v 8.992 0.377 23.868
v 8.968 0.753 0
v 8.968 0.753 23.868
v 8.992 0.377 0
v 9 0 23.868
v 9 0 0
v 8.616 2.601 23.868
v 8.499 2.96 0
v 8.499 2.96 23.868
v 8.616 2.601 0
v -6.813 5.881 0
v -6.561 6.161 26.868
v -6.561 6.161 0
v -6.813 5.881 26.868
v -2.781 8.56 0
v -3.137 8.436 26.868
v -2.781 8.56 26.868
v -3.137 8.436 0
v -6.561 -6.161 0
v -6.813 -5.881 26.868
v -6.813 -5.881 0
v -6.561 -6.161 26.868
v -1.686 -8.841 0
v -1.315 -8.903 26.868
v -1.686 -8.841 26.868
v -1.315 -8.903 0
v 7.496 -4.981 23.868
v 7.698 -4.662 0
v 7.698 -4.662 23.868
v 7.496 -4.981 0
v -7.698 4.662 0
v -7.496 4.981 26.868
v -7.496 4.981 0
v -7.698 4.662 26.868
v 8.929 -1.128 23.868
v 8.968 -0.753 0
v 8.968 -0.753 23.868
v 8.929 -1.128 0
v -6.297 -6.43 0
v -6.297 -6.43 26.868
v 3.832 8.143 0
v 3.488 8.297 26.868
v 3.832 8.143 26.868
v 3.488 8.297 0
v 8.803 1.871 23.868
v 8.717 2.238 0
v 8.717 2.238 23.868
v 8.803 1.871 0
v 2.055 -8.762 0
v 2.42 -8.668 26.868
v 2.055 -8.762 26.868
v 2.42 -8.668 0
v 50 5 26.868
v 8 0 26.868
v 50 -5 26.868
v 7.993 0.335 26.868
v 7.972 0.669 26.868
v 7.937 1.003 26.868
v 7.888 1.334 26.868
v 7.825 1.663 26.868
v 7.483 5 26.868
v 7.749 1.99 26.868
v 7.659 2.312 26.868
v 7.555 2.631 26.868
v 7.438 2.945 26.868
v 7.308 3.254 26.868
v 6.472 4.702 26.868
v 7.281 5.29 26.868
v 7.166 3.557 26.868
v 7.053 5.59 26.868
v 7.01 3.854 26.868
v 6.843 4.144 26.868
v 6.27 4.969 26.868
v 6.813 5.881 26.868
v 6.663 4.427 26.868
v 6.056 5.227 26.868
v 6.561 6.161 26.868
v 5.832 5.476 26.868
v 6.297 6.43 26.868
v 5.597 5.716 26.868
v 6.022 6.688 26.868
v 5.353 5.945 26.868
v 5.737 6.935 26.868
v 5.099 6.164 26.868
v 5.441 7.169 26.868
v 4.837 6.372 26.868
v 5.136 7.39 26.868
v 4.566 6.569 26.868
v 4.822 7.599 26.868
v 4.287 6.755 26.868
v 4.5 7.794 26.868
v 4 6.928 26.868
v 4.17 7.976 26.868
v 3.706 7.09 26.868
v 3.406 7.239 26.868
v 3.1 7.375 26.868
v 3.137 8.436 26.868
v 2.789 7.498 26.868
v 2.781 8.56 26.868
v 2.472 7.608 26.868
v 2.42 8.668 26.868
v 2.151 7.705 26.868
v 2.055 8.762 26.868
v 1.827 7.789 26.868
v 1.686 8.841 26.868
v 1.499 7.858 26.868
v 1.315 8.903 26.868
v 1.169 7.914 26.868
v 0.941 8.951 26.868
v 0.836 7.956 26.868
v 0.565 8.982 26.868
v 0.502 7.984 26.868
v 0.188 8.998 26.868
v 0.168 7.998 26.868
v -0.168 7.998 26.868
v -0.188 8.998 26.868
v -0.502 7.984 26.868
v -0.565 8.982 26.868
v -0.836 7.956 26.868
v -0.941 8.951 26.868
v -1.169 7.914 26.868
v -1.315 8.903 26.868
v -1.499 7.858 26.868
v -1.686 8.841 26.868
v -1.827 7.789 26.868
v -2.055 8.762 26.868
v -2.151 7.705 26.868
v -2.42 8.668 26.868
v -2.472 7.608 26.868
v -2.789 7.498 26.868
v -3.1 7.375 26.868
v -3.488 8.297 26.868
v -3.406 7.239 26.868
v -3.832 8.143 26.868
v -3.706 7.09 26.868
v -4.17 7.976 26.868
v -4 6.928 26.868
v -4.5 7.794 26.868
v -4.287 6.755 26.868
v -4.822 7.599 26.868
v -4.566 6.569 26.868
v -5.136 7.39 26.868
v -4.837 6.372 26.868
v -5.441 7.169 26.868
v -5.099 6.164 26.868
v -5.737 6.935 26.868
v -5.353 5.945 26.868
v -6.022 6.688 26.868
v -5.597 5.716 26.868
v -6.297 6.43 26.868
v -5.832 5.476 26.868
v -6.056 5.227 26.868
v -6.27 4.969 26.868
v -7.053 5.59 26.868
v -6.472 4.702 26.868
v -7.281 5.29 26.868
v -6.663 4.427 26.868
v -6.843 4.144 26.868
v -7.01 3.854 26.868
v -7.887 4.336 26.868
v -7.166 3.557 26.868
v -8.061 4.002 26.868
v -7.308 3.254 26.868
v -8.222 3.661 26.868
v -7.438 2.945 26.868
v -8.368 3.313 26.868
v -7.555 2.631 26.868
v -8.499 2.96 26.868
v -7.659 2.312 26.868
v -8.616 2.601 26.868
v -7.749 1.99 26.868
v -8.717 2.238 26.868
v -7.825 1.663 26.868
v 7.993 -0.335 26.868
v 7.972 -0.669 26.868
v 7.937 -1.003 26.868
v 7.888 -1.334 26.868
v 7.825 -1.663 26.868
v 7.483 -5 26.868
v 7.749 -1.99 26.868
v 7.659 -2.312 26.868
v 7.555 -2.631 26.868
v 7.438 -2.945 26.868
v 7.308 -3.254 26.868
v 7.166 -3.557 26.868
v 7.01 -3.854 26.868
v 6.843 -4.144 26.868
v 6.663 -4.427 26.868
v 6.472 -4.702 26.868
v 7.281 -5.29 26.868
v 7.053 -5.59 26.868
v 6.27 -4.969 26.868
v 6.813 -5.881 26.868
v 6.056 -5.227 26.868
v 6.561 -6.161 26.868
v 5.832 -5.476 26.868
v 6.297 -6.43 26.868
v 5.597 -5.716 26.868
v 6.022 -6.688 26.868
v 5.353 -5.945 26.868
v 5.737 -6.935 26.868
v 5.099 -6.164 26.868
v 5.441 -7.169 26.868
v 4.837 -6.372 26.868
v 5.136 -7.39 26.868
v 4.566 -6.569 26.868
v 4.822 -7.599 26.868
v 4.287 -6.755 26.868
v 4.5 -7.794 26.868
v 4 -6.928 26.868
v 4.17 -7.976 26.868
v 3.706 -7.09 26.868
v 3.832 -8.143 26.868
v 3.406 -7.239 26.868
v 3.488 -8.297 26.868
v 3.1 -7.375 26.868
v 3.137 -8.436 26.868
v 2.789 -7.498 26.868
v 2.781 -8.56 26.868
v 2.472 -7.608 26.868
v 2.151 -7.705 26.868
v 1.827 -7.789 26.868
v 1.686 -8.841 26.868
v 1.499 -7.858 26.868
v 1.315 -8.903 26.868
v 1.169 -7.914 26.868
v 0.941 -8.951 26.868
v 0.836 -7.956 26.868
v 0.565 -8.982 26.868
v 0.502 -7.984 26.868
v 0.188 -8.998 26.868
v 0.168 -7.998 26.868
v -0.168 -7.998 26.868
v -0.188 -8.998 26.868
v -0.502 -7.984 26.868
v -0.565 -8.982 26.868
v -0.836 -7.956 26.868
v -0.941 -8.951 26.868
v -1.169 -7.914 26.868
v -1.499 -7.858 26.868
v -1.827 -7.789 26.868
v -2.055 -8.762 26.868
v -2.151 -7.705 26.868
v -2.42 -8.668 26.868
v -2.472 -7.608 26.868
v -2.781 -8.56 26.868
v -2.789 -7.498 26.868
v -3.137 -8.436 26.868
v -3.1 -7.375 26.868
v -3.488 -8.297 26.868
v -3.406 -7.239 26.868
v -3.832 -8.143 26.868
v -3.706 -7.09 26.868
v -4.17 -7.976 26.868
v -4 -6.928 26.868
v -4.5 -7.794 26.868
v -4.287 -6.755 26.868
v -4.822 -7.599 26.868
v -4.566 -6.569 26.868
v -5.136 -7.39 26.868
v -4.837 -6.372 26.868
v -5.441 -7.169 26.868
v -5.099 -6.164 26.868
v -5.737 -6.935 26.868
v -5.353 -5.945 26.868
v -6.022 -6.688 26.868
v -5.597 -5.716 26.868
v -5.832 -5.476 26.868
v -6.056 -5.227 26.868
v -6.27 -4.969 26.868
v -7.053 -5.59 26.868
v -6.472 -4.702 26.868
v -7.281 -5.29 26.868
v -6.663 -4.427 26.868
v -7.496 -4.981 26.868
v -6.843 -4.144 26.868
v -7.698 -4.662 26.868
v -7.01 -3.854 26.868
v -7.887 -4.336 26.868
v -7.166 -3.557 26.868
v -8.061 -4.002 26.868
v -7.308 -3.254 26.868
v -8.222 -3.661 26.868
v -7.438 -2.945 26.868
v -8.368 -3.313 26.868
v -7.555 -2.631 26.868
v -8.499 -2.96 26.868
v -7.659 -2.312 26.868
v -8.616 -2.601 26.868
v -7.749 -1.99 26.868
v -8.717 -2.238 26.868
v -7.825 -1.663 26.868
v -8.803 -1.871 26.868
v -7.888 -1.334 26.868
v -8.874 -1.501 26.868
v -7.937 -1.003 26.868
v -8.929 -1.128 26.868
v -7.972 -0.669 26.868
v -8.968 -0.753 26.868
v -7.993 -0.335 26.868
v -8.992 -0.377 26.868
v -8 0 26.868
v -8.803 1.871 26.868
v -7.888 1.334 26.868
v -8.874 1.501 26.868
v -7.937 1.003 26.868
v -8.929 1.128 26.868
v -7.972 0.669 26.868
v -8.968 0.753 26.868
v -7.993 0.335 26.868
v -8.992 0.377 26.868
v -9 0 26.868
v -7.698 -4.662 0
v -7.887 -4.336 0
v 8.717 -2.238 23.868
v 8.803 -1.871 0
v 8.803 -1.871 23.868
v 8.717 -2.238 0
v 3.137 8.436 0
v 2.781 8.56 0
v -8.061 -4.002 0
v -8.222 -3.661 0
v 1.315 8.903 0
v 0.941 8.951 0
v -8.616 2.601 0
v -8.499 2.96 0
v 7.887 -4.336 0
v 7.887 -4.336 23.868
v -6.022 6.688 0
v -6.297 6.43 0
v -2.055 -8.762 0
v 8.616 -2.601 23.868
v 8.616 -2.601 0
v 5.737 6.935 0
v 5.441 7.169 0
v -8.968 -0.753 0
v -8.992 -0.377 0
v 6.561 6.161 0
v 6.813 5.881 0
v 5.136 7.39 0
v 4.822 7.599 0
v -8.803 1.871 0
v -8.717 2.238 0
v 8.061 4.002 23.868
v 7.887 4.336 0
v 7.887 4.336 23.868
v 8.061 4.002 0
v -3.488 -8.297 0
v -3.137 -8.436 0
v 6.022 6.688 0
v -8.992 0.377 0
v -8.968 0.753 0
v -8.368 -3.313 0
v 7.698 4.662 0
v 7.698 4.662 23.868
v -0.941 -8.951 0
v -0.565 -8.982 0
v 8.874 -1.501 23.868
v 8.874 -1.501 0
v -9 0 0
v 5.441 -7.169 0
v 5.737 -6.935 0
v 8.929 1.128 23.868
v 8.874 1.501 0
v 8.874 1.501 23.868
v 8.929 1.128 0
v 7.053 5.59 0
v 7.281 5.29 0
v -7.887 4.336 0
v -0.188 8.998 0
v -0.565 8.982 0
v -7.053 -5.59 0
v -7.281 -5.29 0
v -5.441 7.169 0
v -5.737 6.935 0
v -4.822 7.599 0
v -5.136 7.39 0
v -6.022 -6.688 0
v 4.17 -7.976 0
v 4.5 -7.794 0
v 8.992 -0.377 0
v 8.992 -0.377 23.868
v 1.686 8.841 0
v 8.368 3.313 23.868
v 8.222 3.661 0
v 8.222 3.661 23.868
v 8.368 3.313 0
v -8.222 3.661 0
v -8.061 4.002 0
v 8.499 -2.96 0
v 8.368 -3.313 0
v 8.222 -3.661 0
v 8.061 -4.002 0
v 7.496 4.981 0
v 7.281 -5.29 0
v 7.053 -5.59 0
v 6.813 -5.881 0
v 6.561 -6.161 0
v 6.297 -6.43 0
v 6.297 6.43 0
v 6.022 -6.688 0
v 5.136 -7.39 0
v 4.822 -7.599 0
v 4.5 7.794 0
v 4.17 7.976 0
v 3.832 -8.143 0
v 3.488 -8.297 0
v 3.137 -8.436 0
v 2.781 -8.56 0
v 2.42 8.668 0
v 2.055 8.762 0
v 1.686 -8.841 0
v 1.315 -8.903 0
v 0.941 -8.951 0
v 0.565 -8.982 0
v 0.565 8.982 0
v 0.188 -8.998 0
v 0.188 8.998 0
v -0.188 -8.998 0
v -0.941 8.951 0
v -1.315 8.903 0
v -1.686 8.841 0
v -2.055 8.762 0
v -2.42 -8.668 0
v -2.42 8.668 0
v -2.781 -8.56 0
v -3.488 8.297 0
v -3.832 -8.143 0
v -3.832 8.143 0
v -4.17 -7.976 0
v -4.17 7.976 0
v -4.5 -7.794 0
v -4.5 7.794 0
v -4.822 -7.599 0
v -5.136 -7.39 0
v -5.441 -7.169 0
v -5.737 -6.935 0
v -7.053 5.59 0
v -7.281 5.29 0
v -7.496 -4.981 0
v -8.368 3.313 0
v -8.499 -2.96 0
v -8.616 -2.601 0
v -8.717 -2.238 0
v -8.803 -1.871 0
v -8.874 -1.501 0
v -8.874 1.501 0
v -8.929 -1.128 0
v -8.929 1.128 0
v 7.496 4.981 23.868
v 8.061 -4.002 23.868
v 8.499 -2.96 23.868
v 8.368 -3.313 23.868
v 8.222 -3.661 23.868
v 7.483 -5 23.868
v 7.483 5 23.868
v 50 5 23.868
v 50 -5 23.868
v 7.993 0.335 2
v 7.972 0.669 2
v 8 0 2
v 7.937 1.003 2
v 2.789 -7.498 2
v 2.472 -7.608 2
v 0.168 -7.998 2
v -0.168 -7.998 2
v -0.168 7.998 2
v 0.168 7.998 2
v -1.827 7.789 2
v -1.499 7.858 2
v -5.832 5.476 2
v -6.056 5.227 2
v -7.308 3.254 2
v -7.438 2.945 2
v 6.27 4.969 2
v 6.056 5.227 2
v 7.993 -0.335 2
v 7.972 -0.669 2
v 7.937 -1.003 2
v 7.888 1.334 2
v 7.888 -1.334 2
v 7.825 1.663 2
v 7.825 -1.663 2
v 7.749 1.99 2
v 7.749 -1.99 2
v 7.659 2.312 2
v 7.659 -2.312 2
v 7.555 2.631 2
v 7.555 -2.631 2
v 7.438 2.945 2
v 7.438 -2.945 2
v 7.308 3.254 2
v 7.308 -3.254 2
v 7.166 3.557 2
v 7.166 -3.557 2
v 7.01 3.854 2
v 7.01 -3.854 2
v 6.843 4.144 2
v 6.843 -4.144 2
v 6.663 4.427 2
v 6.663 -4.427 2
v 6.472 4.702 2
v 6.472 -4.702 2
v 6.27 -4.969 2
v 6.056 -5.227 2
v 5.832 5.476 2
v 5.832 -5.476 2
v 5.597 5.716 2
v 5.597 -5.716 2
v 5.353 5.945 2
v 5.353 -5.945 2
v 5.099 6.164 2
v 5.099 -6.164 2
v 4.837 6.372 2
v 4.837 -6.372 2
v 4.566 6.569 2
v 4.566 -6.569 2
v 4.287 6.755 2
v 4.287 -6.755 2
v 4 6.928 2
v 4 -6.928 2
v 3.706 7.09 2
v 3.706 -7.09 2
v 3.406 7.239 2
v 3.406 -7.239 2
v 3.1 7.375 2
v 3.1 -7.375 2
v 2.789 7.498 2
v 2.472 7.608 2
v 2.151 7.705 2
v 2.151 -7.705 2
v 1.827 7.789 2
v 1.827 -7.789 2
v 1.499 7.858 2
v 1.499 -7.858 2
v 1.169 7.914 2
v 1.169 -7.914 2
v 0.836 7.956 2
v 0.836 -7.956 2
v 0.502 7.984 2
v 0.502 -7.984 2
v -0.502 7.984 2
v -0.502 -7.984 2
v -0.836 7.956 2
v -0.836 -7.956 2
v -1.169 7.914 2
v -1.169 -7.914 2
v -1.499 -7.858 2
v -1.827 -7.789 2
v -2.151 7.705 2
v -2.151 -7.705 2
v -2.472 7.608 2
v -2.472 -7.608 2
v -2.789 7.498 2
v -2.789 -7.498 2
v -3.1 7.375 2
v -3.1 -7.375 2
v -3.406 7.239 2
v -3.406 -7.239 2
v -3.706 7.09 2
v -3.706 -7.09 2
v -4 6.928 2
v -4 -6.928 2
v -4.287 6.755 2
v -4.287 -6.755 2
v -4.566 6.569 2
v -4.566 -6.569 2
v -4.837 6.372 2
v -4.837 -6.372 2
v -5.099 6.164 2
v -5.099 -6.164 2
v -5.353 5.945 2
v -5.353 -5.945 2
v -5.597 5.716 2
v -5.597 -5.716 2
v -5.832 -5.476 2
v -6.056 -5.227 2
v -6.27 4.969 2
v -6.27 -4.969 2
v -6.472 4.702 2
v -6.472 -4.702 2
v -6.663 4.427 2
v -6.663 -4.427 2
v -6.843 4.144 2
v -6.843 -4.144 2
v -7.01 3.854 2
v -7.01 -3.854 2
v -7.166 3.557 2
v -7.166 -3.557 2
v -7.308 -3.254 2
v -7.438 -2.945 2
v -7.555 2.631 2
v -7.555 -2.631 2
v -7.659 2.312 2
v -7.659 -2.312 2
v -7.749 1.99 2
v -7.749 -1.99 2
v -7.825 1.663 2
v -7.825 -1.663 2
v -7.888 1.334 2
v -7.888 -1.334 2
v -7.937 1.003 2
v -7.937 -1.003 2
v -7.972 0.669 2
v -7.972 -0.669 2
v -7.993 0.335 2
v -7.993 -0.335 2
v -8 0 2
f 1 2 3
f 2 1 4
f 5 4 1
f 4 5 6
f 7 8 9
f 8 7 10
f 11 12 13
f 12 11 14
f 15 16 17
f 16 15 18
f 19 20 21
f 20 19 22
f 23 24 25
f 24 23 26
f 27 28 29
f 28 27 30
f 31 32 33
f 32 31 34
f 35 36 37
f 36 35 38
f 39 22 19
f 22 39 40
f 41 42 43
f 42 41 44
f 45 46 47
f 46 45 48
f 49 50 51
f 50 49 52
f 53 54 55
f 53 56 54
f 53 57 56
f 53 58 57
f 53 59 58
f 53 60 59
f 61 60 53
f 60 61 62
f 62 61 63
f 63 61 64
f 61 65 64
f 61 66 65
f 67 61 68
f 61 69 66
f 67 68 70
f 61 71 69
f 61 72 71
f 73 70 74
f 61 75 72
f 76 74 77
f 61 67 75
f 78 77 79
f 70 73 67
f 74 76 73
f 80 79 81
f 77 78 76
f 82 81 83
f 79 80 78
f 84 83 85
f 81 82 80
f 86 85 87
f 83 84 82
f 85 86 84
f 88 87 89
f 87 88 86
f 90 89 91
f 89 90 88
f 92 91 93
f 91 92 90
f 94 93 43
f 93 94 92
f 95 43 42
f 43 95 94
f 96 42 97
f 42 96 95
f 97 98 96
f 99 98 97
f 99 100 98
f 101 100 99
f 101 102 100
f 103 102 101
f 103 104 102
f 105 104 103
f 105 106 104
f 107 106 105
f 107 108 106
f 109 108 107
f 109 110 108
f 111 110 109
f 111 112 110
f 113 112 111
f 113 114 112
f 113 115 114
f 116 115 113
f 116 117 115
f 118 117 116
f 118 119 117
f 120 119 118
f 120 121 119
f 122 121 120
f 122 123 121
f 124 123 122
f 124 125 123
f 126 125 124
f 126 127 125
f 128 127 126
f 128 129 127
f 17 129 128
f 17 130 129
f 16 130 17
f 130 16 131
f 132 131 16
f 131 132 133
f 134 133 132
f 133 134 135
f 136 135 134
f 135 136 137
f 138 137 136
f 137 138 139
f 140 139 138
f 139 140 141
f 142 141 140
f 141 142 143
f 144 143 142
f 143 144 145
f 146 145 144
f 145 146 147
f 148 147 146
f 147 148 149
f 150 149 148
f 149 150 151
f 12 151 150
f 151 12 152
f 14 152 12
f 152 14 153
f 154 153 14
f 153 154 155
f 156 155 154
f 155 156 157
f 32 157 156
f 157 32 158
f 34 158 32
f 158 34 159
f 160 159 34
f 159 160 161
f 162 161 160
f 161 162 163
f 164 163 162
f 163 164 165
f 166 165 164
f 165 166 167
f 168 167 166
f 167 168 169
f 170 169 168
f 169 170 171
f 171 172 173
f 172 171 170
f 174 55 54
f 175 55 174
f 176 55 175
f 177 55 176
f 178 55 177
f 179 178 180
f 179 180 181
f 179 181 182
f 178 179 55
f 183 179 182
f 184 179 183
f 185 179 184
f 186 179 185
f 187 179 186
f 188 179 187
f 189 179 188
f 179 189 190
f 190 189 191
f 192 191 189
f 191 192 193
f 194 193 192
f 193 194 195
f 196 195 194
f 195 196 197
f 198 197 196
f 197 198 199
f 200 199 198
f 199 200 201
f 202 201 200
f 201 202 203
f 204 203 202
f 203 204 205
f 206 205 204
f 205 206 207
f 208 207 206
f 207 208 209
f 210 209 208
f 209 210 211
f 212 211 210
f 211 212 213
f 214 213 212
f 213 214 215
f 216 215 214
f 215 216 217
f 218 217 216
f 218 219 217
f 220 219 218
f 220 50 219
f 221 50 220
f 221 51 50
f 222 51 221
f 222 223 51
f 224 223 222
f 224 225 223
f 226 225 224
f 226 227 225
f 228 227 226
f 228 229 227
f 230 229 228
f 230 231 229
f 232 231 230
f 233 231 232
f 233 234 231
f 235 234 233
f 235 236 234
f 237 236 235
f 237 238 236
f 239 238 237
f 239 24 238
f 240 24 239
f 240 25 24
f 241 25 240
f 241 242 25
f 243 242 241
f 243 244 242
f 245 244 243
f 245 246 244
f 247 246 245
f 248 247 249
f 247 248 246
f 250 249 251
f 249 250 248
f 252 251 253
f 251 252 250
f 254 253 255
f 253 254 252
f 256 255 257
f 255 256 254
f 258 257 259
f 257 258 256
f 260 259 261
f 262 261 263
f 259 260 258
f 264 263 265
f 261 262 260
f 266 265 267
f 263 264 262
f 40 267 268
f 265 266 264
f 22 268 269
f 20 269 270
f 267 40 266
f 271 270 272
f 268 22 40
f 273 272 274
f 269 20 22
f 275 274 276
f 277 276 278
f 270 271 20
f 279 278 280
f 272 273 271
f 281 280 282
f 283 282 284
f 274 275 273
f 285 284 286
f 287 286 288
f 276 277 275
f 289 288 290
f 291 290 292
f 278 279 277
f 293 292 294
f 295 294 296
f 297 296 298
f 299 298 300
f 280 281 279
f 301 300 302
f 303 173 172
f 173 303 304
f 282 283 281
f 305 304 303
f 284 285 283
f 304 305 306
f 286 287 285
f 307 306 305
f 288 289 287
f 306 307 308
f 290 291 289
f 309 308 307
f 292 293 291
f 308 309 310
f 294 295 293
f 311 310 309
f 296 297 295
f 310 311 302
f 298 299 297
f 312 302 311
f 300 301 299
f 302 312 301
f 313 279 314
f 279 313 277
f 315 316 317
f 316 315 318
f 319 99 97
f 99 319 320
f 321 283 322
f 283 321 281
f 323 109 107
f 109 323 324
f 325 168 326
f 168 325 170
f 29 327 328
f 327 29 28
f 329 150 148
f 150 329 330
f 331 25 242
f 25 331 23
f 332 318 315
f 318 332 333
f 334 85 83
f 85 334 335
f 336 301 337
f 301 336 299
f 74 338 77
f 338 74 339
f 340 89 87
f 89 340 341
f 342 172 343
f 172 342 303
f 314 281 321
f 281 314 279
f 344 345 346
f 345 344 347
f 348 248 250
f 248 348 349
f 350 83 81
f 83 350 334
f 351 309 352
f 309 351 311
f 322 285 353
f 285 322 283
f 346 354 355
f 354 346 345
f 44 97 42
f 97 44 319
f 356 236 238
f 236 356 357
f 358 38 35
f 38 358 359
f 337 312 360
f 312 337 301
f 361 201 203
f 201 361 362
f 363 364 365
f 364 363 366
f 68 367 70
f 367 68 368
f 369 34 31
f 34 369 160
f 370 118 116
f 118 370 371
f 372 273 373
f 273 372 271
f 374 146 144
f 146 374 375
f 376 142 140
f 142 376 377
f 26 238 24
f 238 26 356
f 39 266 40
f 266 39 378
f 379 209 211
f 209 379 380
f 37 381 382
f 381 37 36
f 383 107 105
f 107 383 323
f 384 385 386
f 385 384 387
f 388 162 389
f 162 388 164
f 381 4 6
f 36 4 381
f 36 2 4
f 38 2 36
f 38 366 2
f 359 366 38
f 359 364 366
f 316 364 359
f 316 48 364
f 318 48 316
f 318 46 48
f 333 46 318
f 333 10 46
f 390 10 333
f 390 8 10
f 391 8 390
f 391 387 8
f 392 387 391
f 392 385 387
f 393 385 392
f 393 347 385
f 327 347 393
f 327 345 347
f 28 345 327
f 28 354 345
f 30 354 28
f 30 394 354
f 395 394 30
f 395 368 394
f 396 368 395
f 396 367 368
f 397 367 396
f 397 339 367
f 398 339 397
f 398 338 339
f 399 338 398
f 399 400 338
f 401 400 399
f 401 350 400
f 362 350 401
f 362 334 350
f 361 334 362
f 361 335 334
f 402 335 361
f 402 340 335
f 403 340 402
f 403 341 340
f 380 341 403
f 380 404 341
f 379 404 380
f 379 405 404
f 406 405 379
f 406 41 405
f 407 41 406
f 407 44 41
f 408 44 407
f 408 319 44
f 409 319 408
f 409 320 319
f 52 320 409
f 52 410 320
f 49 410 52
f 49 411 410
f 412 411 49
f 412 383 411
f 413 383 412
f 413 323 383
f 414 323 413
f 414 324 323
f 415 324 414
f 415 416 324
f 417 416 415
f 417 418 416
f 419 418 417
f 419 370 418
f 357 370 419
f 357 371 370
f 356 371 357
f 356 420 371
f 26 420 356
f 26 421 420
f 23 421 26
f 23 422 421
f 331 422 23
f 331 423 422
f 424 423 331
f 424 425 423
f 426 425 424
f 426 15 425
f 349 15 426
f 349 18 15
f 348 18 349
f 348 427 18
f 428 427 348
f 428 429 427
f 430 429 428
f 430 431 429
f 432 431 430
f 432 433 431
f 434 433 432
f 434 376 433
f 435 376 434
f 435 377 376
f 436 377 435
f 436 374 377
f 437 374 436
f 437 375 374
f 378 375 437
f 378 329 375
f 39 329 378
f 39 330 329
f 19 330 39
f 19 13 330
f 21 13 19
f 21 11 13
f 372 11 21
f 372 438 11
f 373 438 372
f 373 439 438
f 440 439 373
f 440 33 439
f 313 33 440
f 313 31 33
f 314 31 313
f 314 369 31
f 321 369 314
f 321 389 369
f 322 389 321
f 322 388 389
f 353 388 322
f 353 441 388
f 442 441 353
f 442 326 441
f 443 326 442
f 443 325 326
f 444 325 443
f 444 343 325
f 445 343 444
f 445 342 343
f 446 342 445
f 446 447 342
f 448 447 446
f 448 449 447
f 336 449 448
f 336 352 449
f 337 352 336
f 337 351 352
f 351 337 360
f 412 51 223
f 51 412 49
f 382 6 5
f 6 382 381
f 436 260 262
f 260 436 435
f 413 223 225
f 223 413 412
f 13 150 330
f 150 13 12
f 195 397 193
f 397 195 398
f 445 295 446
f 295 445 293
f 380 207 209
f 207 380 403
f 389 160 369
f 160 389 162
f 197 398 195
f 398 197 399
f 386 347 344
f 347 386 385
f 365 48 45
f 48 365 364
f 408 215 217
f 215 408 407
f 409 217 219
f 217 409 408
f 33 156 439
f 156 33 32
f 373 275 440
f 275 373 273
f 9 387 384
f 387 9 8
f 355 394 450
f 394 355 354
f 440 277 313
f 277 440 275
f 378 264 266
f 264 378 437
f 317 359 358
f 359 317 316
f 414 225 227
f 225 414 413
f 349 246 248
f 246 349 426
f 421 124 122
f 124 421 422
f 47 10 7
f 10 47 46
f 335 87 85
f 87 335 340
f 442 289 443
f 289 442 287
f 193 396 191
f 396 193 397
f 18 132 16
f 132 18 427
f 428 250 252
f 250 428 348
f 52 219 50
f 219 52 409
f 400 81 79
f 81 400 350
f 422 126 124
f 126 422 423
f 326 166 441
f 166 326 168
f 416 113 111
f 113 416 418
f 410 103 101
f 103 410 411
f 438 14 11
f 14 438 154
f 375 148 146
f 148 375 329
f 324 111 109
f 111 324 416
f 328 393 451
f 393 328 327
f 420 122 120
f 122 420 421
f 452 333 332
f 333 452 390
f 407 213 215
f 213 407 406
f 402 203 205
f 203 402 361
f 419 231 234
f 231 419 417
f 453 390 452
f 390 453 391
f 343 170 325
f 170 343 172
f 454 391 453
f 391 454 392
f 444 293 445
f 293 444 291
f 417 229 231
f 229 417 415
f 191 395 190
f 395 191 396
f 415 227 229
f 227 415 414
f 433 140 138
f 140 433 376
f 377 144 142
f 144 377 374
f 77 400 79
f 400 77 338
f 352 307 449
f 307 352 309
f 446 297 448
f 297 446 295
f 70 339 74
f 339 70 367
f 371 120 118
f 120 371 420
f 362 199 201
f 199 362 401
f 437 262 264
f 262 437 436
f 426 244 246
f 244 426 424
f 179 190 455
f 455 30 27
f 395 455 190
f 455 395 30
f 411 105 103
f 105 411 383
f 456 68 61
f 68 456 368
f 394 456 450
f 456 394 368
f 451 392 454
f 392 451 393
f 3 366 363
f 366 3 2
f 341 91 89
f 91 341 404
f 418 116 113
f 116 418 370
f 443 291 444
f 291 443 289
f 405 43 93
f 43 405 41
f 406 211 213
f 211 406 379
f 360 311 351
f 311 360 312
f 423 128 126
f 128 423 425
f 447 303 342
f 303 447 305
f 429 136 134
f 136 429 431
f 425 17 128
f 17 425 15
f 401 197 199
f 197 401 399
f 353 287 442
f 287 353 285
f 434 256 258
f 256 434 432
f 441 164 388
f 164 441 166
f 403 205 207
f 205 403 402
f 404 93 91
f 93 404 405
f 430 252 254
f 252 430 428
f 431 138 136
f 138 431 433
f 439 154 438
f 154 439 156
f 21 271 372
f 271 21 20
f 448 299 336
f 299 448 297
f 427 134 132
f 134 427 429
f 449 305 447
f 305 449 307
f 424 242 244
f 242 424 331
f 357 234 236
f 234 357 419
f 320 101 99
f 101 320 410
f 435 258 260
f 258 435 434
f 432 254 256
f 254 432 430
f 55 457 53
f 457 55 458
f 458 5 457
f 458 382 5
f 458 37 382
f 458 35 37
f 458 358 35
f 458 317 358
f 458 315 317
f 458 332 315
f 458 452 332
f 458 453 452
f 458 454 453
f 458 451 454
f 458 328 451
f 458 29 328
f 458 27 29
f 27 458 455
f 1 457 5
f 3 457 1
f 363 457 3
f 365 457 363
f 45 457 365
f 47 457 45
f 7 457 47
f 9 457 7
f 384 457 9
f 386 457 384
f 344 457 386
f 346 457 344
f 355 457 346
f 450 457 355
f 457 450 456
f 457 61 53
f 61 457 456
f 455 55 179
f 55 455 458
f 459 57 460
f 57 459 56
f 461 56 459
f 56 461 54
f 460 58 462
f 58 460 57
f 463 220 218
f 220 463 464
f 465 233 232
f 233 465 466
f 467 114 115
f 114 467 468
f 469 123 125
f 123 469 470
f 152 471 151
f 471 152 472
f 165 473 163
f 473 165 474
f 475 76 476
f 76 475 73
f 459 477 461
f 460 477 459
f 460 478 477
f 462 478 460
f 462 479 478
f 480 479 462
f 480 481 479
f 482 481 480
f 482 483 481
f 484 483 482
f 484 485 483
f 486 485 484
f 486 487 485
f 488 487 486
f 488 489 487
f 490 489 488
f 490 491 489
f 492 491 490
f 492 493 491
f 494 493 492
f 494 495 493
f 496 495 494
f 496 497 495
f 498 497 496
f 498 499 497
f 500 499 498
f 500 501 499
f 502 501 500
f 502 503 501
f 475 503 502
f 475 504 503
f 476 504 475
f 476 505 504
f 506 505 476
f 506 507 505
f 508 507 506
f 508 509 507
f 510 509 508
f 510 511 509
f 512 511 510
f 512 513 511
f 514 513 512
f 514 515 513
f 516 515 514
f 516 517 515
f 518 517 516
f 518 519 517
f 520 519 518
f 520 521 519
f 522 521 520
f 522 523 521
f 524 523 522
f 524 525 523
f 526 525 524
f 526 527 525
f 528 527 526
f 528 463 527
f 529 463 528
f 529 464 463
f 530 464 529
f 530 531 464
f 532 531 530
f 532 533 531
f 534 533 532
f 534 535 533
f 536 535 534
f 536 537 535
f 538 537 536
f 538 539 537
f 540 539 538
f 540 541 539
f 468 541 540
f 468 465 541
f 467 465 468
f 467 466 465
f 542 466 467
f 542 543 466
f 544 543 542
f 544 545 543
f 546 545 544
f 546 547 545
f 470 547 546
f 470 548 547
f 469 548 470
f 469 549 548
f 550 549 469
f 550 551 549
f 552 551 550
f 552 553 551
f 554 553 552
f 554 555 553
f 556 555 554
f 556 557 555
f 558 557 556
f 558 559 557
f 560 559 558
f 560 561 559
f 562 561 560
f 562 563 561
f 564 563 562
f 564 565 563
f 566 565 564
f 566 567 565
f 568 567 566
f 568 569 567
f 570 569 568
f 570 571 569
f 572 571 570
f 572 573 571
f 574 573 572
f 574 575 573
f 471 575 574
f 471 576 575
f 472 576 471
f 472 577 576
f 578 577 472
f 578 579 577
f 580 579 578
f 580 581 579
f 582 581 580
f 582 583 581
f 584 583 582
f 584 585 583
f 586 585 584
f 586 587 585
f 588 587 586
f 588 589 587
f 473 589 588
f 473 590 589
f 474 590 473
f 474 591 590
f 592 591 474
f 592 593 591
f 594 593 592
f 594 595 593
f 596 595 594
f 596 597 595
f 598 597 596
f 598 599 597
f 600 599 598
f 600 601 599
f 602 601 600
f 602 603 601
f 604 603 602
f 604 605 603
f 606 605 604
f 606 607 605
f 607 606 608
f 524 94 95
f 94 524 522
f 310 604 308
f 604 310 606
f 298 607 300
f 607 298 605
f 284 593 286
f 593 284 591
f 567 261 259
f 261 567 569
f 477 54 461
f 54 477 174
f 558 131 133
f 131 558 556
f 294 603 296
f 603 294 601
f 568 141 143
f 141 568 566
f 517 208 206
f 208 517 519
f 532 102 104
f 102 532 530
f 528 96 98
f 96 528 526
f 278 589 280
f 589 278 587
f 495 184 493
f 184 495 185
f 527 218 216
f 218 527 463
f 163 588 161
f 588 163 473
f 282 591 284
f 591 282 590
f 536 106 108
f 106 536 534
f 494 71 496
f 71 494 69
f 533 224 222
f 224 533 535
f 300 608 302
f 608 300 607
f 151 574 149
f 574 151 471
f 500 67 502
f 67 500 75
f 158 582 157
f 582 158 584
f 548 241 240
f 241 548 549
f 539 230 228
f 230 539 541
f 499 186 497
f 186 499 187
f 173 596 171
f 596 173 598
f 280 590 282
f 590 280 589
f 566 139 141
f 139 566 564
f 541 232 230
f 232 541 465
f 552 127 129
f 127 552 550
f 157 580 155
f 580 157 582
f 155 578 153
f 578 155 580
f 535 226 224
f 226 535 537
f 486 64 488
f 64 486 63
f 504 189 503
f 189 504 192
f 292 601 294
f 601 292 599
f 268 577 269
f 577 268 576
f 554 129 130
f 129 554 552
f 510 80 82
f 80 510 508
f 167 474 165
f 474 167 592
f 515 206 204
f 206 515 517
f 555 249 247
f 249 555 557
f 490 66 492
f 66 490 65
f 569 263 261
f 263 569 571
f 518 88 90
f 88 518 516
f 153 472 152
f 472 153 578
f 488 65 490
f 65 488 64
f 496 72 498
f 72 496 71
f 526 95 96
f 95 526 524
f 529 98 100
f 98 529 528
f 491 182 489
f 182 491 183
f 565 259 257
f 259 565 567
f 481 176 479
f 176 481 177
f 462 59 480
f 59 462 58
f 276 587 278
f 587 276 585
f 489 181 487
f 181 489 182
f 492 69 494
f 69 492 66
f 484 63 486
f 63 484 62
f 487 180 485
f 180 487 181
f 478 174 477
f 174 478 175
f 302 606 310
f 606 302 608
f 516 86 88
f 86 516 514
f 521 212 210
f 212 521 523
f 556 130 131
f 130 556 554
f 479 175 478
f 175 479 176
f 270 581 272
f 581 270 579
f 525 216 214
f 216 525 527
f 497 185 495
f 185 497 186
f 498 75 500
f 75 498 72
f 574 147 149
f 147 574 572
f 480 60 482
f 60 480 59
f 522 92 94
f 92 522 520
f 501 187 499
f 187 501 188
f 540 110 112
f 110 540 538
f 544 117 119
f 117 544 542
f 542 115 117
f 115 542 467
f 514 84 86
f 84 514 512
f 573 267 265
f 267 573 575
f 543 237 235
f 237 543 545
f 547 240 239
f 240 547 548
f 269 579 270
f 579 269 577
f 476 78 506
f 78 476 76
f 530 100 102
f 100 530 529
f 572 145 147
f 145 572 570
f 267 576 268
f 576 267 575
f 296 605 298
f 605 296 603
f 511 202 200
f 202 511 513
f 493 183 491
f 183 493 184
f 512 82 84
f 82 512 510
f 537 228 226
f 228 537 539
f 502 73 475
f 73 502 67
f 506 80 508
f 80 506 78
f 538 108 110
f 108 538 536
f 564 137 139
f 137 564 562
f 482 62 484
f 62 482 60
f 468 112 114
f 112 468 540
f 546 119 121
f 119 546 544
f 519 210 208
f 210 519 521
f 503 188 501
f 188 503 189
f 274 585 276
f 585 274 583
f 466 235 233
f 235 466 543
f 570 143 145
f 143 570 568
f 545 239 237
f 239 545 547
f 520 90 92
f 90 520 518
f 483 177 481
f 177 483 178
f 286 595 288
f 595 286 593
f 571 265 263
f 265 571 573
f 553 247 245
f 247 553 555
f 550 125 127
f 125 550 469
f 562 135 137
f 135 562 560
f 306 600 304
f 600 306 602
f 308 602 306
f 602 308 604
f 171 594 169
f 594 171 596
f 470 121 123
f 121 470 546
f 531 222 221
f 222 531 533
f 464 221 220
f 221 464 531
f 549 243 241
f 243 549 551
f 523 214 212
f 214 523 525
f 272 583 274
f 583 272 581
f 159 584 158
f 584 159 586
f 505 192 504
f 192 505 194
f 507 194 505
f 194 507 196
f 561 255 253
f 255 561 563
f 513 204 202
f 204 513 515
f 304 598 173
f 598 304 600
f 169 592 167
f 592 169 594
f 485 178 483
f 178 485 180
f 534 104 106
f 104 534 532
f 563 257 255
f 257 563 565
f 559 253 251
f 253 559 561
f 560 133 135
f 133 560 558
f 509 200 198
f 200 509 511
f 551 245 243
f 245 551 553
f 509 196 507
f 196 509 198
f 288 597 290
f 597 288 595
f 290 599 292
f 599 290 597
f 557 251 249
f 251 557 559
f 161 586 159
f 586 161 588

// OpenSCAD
$fn=150;

volume = 5; // in mililiter

height = (volume * 1000) / (PI * 64); 
// h = V / pi * r^2
// 1 mililiter = 1000 cubic milimeters
// -> Volumen * 1000

difference(){
	union(){
		cylinder(h=height+2,r=9);
		translate([0,-5,height-1])cube([50,10,3]);
	}
	translate([0,0,2])cylinder(h=100,r=8);
}
